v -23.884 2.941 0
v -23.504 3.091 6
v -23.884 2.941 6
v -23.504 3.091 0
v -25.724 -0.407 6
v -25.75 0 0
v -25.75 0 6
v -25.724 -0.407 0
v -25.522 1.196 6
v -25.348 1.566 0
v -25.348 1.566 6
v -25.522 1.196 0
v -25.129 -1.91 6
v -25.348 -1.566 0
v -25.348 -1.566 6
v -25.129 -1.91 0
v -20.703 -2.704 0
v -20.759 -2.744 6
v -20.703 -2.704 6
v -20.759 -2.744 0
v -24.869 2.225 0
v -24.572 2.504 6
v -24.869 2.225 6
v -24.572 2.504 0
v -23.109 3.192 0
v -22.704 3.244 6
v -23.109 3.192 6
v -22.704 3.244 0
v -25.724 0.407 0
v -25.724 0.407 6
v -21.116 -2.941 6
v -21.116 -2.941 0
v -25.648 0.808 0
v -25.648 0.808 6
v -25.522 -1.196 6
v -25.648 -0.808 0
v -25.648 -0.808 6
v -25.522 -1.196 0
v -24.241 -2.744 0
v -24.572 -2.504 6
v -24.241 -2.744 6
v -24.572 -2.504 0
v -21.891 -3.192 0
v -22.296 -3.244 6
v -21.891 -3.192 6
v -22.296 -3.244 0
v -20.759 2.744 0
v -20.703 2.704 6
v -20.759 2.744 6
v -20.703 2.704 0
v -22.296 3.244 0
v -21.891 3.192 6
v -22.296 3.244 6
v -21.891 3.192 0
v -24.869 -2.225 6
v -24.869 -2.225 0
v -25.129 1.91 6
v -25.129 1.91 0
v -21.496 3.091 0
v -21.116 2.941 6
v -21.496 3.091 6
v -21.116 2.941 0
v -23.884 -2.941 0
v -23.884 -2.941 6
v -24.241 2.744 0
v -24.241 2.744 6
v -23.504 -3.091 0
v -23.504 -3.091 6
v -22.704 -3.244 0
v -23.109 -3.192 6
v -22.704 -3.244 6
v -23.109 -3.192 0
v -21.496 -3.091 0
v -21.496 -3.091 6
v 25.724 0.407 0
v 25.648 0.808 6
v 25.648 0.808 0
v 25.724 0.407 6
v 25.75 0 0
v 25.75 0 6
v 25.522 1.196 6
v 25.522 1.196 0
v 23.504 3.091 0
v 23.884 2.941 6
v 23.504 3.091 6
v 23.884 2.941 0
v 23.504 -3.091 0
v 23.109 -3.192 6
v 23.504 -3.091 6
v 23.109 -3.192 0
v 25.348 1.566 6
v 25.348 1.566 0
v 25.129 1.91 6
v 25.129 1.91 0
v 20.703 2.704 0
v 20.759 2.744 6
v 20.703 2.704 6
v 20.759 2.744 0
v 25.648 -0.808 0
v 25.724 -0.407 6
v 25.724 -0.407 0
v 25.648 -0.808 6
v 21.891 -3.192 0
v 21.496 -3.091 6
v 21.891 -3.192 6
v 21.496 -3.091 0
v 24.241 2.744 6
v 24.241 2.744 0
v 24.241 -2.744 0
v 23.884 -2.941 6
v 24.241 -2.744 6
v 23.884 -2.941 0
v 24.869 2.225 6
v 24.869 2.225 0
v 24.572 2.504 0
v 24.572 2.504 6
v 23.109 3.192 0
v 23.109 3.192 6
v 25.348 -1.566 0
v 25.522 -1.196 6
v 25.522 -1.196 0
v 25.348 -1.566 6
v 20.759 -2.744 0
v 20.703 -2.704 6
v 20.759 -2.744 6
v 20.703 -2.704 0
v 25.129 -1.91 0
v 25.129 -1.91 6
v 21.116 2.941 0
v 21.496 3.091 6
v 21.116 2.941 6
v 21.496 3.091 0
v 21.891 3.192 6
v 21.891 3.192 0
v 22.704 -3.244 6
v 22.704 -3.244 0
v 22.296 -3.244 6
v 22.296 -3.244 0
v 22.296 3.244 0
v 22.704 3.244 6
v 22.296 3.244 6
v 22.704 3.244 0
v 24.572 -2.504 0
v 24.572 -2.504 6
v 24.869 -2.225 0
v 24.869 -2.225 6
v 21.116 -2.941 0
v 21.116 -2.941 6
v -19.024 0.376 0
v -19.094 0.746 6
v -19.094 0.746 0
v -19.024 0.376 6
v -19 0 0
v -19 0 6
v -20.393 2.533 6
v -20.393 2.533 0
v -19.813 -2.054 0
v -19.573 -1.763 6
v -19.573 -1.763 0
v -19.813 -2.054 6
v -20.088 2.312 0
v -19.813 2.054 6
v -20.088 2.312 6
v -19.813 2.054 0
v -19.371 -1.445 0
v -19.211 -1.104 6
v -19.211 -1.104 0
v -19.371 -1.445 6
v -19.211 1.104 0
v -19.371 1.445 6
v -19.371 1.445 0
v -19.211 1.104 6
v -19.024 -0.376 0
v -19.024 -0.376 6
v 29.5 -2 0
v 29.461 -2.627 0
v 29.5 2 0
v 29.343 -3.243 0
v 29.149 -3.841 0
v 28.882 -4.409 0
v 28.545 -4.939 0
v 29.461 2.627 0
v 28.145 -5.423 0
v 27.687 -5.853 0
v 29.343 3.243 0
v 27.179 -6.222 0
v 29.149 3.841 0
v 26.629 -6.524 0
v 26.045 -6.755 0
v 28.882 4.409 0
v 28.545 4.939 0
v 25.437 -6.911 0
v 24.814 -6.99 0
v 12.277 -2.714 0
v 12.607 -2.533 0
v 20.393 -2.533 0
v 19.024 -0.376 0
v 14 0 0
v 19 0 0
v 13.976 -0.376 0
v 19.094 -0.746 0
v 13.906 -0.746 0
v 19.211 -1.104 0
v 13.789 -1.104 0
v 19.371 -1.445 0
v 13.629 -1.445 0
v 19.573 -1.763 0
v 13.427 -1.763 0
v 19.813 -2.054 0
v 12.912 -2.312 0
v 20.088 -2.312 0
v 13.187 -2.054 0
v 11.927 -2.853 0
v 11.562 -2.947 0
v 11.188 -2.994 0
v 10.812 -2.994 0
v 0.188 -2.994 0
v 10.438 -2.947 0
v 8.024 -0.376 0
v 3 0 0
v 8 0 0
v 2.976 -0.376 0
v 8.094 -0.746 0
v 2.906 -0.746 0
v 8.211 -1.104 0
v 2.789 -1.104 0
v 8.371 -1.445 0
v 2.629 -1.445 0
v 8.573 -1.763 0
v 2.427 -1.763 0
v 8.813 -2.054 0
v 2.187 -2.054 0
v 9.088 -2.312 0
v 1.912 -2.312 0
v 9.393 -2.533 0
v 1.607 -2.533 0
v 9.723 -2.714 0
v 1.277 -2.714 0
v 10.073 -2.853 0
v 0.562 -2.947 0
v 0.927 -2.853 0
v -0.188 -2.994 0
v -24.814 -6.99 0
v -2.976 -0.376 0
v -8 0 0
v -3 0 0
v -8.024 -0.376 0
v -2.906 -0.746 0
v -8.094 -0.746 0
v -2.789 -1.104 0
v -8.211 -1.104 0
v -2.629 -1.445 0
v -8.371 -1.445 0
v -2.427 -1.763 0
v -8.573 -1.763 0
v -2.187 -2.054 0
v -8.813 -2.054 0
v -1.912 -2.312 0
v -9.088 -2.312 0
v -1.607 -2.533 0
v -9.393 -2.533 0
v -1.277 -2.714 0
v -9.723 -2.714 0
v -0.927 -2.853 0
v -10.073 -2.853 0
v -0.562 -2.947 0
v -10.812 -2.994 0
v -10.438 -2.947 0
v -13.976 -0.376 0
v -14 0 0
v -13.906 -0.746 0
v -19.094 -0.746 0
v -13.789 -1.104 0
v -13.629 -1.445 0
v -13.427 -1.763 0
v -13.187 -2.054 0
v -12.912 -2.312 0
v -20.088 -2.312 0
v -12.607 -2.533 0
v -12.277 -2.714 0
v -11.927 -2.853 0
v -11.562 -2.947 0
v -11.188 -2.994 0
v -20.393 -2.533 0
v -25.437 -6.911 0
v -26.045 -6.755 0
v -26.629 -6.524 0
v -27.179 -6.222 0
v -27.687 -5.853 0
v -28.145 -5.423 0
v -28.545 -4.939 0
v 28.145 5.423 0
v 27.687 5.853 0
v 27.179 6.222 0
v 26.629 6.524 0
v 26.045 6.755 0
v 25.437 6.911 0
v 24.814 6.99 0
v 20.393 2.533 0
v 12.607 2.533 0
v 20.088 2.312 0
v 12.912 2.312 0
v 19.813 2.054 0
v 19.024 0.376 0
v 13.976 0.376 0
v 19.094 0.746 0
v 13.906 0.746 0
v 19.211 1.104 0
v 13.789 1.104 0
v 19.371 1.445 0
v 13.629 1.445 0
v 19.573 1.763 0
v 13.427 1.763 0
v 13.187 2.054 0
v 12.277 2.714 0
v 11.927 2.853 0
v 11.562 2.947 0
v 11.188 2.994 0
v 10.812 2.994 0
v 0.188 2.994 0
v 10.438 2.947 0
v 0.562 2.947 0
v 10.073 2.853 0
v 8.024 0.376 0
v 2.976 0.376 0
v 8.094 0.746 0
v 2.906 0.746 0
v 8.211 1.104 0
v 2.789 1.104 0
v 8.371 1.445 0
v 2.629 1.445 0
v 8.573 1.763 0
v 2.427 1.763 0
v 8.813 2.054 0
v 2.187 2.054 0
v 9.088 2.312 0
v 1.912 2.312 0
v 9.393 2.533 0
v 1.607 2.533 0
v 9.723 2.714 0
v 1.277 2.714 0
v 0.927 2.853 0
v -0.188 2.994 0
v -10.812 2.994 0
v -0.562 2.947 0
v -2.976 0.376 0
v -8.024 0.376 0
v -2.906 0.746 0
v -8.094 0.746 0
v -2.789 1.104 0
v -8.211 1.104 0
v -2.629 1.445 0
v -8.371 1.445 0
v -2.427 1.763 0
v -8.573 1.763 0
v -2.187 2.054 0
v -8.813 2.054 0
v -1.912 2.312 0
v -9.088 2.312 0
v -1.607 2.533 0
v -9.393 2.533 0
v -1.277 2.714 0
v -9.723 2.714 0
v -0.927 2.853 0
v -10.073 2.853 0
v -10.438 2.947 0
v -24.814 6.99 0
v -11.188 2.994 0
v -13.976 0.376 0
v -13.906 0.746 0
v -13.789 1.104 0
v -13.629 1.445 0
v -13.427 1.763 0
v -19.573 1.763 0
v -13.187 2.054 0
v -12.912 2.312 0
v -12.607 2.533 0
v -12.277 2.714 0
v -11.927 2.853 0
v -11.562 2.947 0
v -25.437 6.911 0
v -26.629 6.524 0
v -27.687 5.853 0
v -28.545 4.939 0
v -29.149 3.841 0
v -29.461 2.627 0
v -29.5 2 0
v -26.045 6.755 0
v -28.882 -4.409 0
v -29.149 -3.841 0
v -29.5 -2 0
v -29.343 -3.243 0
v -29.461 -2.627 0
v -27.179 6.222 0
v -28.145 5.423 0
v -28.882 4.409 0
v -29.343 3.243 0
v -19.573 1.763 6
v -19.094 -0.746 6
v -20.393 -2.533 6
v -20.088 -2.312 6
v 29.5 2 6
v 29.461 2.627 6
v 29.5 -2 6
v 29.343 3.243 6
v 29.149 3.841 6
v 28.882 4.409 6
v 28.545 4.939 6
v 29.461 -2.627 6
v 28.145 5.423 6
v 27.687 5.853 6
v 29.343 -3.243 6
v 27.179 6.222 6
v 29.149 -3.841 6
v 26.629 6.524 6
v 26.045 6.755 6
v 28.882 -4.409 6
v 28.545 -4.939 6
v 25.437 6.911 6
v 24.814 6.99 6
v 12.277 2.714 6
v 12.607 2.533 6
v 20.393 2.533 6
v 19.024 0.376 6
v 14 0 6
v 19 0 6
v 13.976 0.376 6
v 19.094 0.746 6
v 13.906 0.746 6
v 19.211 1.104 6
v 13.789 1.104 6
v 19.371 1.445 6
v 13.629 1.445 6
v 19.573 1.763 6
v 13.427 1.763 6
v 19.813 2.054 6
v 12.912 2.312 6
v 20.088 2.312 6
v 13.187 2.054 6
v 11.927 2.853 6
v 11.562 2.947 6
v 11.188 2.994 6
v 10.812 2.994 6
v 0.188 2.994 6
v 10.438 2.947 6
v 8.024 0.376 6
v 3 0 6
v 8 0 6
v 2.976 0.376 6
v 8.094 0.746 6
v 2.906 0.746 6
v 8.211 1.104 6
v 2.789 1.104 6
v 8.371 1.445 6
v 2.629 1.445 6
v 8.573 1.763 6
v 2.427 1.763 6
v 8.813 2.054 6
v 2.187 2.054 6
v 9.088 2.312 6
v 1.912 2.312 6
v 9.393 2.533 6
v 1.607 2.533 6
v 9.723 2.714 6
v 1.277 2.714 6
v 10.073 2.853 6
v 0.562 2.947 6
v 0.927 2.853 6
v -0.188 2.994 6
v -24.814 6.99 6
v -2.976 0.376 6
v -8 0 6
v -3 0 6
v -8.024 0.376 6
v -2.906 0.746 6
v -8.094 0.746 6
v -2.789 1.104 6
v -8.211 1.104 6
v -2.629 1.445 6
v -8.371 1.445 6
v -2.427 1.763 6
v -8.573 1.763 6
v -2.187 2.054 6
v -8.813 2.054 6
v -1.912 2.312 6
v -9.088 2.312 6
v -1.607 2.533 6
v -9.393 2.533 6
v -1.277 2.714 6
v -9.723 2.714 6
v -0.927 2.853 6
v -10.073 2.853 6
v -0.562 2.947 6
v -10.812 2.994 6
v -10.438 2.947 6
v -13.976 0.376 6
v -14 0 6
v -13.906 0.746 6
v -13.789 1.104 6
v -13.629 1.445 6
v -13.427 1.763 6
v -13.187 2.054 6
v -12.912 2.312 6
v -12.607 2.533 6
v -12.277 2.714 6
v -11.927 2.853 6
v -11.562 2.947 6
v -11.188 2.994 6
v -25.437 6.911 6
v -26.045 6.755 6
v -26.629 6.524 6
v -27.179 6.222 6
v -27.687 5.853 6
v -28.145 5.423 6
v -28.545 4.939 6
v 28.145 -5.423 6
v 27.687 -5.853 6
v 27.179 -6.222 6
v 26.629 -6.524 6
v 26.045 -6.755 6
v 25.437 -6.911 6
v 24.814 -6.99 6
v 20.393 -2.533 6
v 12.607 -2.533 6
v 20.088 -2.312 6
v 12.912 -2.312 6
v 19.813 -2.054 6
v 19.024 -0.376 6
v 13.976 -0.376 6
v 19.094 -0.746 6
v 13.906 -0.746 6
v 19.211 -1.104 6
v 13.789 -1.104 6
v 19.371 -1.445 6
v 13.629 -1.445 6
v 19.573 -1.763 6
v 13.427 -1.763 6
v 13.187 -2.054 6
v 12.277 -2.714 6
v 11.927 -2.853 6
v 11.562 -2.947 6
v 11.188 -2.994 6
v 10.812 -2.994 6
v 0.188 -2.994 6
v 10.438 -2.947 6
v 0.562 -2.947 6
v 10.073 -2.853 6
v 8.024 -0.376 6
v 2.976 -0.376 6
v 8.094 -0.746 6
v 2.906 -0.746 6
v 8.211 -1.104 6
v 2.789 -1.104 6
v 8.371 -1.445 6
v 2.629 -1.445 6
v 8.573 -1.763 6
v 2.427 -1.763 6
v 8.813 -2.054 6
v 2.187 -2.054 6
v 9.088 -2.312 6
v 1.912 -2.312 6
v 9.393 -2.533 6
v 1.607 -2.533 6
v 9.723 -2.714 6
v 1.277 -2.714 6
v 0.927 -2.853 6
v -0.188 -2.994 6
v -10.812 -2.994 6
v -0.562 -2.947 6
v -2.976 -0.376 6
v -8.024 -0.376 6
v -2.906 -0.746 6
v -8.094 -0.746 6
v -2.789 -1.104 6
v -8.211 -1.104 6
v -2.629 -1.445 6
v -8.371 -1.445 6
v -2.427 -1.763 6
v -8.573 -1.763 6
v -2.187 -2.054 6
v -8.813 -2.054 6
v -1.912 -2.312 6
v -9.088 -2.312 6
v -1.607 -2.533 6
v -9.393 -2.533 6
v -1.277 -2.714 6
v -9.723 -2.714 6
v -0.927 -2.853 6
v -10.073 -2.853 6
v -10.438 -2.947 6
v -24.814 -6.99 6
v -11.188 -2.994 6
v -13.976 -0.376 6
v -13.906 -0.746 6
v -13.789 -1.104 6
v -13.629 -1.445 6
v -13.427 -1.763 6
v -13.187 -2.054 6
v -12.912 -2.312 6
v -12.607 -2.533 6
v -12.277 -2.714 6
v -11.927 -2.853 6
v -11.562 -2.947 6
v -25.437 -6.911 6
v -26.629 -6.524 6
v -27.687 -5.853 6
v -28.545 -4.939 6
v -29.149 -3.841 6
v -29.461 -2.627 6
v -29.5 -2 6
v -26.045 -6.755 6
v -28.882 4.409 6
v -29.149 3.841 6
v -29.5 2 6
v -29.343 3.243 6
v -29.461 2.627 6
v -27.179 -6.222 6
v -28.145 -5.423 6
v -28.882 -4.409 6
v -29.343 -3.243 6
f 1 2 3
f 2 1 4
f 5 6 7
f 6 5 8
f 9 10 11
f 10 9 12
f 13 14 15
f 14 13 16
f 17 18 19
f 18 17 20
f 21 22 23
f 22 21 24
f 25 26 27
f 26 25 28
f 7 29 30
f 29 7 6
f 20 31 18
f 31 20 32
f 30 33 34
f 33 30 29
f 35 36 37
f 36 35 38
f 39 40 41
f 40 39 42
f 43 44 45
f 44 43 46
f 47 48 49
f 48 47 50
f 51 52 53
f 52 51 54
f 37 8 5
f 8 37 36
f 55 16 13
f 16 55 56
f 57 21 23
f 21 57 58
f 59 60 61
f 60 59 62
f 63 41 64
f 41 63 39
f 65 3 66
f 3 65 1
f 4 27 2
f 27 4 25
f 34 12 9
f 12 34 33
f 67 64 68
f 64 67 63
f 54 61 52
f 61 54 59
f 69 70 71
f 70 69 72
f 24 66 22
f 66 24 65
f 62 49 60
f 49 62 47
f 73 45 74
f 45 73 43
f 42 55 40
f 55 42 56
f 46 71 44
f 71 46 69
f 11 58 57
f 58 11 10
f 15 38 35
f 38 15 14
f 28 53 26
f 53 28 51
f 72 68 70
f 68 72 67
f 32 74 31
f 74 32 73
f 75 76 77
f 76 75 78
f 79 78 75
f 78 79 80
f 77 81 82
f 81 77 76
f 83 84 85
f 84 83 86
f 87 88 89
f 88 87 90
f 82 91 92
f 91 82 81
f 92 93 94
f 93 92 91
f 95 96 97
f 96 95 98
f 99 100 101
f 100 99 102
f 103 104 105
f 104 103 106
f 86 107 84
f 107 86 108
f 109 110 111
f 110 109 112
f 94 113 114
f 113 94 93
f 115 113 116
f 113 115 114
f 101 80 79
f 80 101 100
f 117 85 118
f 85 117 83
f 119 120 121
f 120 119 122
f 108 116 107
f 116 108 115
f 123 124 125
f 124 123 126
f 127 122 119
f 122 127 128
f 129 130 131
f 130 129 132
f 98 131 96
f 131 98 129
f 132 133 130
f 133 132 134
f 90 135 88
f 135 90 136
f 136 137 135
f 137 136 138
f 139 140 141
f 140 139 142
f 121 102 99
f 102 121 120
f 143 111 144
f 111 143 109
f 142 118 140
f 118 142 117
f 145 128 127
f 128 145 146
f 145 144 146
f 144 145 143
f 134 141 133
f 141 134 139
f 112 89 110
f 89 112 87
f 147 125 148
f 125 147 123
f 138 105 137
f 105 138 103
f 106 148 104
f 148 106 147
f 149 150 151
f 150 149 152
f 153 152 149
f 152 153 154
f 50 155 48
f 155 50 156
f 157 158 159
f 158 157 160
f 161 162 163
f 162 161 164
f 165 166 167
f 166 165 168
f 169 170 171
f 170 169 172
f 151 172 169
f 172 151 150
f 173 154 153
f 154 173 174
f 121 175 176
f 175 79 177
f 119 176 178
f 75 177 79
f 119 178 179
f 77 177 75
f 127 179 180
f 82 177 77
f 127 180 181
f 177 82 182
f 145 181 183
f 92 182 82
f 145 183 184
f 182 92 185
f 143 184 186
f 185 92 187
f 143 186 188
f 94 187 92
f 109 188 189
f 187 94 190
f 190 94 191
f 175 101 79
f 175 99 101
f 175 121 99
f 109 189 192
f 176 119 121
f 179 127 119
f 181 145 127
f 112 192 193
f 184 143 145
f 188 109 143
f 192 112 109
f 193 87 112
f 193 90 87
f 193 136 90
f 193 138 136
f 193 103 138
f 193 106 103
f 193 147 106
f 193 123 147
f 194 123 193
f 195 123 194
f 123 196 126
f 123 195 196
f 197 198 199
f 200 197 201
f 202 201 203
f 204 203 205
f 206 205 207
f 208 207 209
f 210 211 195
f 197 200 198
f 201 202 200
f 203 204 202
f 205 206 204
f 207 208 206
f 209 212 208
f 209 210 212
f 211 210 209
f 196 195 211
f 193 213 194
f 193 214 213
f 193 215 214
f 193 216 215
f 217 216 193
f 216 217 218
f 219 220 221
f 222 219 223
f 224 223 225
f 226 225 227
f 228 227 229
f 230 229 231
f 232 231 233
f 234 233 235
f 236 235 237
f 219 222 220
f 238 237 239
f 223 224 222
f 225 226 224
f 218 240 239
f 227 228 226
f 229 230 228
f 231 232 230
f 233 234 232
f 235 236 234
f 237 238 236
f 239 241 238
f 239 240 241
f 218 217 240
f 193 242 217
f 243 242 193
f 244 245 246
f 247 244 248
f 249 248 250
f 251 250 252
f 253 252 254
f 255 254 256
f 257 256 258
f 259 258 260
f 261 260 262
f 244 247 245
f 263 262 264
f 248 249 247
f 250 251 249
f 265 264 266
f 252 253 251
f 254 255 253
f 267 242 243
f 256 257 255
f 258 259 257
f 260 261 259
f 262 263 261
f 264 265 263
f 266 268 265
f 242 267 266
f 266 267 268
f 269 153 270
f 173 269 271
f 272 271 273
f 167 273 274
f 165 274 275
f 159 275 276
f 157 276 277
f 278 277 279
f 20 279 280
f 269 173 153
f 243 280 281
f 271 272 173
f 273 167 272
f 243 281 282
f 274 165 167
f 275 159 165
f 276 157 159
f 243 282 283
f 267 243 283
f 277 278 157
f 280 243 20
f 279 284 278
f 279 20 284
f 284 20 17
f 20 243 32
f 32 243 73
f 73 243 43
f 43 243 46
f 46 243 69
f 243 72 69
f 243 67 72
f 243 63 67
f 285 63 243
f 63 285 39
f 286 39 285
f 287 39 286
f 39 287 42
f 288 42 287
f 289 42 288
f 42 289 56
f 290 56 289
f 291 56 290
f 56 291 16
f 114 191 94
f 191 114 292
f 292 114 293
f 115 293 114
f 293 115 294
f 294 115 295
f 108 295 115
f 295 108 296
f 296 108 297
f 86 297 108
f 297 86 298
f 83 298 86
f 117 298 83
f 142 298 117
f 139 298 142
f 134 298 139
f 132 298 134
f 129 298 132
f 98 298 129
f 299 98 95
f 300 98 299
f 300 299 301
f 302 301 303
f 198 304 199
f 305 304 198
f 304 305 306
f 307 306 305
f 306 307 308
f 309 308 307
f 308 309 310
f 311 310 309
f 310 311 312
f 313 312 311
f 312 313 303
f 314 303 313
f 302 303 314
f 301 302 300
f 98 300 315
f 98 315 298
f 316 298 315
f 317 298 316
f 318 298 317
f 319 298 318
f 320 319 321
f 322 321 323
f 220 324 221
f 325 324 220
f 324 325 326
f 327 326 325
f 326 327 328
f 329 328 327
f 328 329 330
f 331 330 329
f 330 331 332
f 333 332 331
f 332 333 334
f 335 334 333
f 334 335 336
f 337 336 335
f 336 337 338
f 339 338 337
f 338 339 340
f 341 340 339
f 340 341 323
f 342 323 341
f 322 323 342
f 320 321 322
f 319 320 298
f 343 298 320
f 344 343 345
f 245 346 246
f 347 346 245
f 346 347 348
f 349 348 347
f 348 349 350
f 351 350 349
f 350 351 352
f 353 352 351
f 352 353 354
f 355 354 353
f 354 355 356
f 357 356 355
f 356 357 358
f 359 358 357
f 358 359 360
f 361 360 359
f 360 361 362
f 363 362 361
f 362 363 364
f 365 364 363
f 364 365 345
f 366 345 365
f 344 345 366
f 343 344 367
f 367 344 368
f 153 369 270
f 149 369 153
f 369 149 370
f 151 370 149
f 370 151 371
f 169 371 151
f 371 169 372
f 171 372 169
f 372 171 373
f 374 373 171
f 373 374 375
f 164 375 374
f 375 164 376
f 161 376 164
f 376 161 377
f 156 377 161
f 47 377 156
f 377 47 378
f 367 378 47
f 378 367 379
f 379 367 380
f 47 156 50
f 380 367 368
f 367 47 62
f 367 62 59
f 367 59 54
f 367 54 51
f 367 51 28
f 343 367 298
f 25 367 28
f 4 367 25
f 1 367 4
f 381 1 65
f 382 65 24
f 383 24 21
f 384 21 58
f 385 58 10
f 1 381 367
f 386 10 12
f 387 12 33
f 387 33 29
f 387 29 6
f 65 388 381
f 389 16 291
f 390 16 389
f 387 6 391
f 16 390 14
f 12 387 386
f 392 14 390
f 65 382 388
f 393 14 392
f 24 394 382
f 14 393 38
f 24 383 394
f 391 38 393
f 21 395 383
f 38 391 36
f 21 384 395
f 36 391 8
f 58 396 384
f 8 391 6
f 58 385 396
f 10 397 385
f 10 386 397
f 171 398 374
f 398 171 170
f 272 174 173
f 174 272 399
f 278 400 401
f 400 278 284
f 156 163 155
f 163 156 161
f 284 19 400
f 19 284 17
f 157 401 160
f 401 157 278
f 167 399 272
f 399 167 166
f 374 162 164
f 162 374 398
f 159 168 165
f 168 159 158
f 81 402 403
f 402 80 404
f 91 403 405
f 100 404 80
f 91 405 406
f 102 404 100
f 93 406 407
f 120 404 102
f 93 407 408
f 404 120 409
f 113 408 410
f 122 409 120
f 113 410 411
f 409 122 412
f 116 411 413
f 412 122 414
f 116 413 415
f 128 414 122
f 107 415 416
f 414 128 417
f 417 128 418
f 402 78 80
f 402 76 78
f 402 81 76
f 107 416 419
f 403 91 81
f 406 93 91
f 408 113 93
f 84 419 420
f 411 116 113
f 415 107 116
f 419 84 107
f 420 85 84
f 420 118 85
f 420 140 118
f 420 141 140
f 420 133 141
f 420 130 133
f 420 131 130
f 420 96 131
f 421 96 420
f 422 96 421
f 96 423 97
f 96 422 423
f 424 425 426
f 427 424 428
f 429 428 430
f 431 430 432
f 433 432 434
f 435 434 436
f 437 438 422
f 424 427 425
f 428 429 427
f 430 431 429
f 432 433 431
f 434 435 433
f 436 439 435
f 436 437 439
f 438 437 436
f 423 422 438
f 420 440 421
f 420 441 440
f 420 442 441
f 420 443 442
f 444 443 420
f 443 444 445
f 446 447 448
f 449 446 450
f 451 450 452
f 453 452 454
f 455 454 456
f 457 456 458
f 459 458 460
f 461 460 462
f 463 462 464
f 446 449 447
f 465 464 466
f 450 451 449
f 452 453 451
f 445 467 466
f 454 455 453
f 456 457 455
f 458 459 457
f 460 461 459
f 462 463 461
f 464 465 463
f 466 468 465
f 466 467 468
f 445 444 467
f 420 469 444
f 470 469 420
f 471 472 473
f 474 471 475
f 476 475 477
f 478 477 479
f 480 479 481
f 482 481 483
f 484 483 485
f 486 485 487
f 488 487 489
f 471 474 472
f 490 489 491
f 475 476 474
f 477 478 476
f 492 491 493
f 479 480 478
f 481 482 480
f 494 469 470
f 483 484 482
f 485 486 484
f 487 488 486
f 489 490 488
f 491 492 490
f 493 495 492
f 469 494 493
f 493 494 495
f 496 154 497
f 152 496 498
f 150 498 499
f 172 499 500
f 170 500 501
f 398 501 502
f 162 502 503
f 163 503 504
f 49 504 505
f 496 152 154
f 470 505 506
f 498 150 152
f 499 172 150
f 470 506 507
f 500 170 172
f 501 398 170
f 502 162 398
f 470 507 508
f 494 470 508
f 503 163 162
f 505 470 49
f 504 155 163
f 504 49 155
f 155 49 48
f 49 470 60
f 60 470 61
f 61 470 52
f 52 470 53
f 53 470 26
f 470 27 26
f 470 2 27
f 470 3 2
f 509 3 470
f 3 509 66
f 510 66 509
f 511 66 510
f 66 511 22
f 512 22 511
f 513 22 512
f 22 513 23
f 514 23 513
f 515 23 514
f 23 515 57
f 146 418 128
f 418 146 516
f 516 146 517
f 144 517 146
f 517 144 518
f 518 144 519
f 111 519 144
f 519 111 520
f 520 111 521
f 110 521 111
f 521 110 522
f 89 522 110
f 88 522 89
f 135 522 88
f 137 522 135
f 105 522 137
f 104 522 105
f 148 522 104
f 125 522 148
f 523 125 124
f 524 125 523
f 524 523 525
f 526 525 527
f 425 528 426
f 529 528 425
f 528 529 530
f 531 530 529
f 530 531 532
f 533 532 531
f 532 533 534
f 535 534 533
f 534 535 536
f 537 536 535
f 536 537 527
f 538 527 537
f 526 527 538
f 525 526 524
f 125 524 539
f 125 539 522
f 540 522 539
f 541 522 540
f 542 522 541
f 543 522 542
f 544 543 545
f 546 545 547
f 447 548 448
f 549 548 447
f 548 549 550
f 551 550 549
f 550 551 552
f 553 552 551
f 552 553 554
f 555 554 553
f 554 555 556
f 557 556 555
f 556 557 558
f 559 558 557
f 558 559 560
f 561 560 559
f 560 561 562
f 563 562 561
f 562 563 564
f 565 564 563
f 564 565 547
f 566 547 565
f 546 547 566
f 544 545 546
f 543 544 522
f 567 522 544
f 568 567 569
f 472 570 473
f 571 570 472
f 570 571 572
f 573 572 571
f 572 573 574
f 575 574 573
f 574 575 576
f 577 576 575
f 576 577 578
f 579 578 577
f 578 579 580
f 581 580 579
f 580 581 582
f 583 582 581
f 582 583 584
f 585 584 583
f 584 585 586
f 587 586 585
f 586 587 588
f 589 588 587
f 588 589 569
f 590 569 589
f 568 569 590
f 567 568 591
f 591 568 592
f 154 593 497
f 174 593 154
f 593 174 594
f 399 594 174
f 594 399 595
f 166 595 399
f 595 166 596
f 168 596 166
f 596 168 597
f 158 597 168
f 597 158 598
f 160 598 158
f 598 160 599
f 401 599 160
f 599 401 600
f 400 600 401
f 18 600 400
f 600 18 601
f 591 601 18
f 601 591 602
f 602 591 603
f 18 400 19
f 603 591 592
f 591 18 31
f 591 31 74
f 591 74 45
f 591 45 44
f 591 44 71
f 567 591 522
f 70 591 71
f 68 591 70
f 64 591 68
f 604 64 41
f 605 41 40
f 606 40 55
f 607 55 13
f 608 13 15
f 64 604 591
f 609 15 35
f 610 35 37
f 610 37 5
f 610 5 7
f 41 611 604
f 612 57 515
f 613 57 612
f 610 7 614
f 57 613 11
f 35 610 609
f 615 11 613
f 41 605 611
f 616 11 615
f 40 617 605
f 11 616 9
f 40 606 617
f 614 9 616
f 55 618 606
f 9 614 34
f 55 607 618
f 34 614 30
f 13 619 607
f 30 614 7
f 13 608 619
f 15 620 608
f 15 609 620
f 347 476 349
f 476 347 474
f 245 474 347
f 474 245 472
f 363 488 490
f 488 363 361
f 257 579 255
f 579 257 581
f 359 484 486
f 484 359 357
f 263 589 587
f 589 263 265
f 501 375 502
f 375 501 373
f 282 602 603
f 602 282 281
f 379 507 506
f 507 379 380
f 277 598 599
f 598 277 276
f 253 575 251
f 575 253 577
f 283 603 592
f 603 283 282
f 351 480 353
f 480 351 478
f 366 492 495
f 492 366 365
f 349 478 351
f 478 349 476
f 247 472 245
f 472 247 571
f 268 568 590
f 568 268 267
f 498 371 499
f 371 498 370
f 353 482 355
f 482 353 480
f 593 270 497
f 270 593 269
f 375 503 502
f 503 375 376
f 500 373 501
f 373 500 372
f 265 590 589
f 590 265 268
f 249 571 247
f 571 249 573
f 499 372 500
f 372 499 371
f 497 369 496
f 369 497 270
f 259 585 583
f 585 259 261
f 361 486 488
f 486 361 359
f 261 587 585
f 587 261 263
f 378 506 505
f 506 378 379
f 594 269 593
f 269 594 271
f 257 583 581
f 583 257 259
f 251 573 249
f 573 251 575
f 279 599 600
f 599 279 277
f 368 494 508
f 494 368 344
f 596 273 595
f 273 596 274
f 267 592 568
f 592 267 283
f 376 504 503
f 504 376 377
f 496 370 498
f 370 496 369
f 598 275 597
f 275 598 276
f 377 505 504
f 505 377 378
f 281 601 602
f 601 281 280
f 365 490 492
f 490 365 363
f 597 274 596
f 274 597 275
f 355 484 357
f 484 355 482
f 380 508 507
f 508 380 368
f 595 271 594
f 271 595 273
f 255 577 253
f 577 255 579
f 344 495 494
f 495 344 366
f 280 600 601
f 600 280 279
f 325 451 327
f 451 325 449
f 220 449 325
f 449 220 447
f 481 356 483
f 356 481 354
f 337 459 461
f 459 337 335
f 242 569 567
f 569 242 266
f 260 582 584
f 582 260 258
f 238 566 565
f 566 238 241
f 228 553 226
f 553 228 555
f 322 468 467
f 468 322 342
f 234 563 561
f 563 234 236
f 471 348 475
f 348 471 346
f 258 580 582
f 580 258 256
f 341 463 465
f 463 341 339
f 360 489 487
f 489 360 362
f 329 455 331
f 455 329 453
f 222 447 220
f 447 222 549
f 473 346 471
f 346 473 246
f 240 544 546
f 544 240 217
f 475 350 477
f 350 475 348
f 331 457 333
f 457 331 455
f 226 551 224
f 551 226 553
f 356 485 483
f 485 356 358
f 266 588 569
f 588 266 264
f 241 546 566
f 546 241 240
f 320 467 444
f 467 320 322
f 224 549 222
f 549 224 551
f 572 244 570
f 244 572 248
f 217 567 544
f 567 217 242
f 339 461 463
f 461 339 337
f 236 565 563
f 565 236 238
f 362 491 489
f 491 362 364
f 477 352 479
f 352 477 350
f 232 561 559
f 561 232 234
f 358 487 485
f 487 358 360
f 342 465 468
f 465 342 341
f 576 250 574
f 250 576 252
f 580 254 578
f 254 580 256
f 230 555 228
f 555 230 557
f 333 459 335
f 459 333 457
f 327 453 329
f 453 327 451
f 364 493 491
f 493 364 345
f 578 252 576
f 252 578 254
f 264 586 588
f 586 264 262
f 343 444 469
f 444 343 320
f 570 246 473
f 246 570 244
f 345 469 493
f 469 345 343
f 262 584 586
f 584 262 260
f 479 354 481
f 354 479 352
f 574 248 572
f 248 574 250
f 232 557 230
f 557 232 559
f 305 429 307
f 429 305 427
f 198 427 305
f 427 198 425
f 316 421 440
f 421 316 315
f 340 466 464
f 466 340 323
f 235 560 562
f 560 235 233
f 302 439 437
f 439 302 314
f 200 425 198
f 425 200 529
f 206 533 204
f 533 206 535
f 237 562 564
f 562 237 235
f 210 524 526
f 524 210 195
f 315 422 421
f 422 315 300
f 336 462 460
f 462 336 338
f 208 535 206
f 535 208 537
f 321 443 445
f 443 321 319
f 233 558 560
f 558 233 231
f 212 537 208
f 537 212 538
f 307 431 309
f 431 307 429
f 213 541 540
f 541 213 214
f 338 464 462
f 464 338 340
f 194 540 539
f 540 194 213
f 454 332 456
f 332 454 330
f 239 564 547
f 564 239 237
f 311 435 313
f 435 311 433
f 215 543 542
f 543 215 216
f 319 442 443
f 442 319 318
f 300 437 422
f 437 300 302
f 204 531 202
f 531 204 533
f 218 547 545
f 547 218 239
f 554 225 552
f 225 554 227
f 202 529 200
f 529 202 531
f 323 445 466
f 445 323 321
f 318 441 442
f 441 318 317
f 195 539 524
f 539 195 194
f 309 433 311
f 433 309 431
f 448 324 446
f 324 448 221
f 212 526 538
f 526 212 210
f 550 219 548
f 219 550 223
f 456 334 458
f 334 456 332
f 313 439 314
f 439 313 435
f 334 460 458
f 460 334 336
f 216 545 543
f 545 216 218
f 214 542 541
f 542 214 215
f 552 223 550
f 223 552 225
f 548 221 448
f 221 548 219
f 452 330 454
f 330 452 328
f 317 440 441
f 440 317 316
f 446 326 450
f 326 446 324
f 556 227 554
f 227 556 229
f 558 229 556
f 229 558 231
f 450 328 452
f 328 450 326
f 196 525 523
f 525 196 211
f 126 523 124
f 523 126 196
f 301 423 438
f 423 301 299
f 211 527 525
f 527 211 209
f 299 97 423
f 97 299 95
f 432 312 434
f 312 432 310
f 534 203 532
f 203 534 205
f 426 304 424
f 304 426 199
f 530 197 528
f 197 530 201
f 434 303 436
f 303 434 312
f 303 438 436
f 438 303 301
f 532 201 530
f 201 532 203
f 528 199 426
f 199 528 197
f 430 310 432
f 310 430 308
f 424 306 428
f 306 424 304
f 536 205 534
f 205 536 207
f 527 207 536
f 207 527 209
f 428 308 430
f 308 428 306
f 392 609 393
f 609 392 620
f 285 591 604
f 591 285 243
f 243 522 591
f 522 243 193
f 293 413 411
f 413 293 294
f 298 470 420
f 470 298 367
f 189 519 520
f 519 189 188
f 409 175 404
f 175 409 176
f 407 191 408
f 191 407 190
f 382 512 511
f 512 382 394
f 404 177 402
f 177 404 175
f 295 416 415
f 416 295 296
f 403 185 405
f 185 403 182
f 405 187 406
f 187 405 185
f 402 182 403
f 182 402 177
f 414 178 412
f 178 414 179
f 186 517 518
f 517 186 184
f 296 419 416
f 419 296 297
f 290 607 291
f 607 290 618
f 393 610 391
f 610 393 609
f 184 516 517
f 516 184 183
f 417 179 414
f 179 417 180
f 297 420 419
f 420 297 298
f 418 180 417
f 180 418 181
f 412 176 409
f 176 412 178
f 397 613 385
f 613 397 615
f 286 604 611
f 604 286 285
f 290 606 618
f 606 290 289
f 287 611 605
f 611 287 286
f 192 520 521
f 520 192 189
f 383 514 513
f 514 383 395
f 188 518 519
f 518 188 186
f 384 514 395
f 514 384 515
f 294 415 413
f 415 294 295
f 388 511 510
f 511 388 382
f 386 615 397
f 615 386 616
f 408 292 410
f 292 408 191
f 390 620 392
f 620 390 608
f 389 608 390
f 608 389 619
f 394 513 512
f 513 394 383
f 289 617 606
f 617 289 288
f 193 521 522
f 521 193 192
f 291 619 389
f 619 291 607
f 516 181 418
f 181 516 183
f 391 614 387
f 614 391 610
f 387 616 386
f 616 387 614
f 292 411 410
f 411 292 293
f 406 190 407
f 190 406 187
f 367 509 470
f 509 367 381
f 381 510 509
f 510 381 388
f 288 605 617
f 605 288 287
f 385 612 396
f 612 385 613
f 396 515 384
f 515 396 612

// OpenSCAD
$fn = 50;


difference() {
	union() {
		hull() {
			translate(v = [-24.5000000000, 2.0000000000, 0]) {
				cylinder(h = 6, r = 5);
			}
			translate(v = [24.5000000000, 2.0000000000, 0]) {
				cylinder(h = 6, r = 5);
			}
			translate(v = [-24.5000000000, -2.0000000000, 0]) {
				cylinder(h = 6, r = 5);
			}
			translate(v = [24.5000000000, -2.0000000000, 0]) {
				cylinder(h = 6, r = 5);
			}
		}
	}
	union() {
		#translate(v = [-22.5000000000, 0.0000000000, -100.0000000000]) {
			cylinder(h = 200, r = 3.2500000000);
		}
		#translate(v = [-22.5000000000, 0.0000000000, -100.0000000000]) {
			cylinder(h = 200, r = 3.2500000000);
		}
		#translate(v = [22.5000000000, 0.0000000000, -100.0000000000]) {
			cylinder(h = 200, r = 3.2500000000);
		}
		#translate(v = [22.5000000000, 0.0000000000, -100.0000000000]) {
			cylinder(h = 200, r = 3.2500000000);
		}
		#translate(v = [-22.0000000000, 0, 0]) {
			cylinder(h = 6, r = 3.0000000000);
		}
		#translate(v = [-11.0000000000, 0, 0]) {
			cylinder(h = 6, r = 3.0000000000);
		}
		#cylinder(h = 6, r = 3.0000000000);
		#translate(v = [11.0000000000, 0, 0]) {
			cylinder(h = 6, r = 3.0000000000);
		}
		#translate(v = [22.0000000000, 0, 0]) {
			cylinder(h = 6, r = 3.0000000000);
		}
	}
}
